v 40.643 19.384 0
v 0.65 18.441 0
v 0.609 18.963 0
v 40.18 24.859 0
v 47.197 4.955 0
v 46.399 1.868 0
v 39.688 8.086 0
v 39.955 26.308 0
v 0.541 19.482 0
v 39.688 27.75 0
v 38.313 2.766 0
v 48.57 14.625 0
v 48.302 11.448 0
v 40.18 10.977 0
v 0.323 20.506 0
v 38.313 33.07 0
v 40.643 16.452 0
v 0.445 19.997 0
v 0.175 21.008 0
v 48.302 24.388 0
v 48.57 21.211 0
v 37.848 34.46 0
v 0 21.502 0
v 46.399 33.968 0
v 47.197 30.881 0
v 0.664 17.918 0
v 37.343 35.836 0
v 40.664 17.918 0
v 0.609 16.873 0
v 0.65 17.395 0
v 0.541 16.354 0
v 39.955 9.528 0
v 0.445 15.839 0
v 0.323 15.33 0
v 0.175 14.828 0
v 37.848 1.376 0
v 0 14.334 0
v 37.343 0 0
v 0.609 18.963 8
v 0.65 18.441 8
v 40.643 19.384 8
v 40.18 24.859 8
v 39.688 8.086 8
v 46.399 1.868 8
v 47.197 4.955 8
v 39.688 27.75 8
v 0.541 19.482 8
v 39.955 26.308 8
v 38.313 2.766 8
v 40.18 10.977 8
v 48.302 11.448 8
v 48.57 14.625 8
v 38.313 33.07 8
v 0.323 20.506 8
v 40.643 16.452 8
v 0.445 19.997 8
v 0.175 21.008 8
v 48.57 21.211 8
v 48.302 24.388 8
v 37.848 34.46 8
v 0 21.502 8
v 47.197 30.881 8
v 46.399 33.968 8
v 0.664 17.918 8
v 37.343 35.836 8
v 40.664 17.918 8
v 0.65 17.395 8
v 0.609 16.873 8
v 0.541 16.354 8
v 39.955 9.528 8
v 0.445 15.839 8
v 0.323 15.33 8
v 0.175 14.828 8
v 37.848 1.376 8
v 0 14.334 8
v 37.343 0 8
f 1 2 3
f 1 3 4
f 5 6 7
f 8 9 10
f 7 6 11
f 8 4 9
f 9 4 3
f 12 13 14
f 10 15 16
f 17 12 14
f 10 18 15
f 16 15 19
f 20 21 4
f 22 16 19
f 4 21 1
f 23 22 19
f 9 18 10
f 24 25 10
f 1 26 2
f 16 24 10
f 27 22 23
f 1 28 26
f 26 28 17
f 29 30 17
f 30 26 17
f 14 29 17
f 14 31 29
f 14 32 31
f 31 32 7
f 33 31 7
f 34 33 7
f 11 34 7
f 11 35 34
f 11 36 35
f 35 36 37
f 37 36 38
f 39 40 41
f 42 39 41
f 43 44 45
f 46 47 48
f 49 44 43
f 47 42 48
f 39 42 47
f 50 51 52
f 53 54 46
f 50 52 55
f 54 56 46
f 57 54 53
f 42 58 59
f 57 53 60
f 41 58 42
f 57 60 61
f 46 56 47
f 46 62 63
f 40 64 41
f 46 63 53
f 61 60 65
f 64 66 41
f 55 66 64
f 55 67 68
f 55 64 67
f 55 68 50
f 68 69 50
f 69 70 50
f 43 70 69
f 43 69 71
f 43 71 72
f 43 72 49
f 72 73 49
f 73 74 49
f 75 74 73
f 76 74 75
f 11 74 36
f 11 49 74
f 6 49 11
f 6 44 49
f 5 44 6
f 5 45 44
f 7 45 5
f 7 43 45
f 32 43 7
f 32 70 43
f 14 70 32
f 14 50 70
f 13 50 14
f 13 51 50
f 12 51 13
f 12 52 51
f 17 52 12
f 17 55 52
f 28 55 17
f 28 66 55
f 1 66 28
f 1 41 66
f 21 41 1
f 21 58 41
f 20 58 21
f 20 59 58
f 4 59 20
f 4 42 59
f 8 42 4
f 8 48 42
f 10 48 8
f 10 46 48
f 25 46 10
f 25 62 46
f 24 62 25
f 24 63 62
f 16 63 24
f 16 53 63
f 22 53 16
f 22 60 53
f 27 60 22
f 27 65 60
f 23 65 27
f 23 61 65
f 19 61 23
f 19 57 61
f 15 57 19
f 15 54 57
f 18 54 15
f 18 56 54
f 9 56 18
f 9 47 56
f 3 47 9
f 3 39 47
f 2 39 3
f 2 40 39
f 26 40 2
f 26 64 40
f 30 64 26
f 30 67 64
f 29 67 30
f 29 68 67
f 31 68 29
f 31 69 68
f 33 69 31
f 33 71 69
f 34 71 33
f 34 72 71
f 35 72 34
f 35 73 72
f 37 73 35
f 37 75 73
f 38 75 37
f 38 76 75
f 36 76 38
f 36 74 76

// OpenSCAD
$fn = 32;

// ----------------------------------------------------------------------
// Gear sector: 4 teeth on 42 degrees
// ----------------------------------------------------------------------

// --- parameters (mm) ---
sector_angle = 42;        // sector angle, degrees
root_r = 50;              // root circle radius
tooth_h = 8;              // tooth height over the root circle
teeth = 4;                // number of teeth on the sector
hub_r = 10;               // hub bore radius
plate_t = 8;              // sector thickness, Z
arc_step = 3;             // sampling step of the root/hub arcs, degrees

tip_r = root_r + tooth_h;  // tip circle radius

profile = [[37.343, 0], [37.848, 1.376], [38.313, 2.766], [46.399, 1.868], [47.197, 4.955], [39.688, 8.086], [39.955, 9.528], [40.18, 10.977], [48.302, 11.448], [48.57, 14.625], [40.643, 16.452], [40.664, 17.918], [40.643, 19.384], [48.57, 21.211], [48.302, 24.388], [40.18, 24.859], [39.955, 26.308], [39.688, 27.75], [47.197, 30.881], [46.399, 33.968], [38.313, 33.07], [37.848, 34.46], [37.343, 35.836], [0, 21.502], [0.175, 21.008], [0.323, 20.506], [0.445, 19.997], [0.541, 19.482], [0.609, 18.963], [0.65, 18.441], [0.664, 17.918], [0.65, 17.395], [0.609, 16.873], [0.541, 16.354], [0.445, 15.839], [0.323, 15.33], [0.175, 14.828], [0, 14.334]];  // primary outline, 38 points, counter clockwise

// --- the one profile operation ---
linear_extrude(height = plate_t) polygon(points = profile);
